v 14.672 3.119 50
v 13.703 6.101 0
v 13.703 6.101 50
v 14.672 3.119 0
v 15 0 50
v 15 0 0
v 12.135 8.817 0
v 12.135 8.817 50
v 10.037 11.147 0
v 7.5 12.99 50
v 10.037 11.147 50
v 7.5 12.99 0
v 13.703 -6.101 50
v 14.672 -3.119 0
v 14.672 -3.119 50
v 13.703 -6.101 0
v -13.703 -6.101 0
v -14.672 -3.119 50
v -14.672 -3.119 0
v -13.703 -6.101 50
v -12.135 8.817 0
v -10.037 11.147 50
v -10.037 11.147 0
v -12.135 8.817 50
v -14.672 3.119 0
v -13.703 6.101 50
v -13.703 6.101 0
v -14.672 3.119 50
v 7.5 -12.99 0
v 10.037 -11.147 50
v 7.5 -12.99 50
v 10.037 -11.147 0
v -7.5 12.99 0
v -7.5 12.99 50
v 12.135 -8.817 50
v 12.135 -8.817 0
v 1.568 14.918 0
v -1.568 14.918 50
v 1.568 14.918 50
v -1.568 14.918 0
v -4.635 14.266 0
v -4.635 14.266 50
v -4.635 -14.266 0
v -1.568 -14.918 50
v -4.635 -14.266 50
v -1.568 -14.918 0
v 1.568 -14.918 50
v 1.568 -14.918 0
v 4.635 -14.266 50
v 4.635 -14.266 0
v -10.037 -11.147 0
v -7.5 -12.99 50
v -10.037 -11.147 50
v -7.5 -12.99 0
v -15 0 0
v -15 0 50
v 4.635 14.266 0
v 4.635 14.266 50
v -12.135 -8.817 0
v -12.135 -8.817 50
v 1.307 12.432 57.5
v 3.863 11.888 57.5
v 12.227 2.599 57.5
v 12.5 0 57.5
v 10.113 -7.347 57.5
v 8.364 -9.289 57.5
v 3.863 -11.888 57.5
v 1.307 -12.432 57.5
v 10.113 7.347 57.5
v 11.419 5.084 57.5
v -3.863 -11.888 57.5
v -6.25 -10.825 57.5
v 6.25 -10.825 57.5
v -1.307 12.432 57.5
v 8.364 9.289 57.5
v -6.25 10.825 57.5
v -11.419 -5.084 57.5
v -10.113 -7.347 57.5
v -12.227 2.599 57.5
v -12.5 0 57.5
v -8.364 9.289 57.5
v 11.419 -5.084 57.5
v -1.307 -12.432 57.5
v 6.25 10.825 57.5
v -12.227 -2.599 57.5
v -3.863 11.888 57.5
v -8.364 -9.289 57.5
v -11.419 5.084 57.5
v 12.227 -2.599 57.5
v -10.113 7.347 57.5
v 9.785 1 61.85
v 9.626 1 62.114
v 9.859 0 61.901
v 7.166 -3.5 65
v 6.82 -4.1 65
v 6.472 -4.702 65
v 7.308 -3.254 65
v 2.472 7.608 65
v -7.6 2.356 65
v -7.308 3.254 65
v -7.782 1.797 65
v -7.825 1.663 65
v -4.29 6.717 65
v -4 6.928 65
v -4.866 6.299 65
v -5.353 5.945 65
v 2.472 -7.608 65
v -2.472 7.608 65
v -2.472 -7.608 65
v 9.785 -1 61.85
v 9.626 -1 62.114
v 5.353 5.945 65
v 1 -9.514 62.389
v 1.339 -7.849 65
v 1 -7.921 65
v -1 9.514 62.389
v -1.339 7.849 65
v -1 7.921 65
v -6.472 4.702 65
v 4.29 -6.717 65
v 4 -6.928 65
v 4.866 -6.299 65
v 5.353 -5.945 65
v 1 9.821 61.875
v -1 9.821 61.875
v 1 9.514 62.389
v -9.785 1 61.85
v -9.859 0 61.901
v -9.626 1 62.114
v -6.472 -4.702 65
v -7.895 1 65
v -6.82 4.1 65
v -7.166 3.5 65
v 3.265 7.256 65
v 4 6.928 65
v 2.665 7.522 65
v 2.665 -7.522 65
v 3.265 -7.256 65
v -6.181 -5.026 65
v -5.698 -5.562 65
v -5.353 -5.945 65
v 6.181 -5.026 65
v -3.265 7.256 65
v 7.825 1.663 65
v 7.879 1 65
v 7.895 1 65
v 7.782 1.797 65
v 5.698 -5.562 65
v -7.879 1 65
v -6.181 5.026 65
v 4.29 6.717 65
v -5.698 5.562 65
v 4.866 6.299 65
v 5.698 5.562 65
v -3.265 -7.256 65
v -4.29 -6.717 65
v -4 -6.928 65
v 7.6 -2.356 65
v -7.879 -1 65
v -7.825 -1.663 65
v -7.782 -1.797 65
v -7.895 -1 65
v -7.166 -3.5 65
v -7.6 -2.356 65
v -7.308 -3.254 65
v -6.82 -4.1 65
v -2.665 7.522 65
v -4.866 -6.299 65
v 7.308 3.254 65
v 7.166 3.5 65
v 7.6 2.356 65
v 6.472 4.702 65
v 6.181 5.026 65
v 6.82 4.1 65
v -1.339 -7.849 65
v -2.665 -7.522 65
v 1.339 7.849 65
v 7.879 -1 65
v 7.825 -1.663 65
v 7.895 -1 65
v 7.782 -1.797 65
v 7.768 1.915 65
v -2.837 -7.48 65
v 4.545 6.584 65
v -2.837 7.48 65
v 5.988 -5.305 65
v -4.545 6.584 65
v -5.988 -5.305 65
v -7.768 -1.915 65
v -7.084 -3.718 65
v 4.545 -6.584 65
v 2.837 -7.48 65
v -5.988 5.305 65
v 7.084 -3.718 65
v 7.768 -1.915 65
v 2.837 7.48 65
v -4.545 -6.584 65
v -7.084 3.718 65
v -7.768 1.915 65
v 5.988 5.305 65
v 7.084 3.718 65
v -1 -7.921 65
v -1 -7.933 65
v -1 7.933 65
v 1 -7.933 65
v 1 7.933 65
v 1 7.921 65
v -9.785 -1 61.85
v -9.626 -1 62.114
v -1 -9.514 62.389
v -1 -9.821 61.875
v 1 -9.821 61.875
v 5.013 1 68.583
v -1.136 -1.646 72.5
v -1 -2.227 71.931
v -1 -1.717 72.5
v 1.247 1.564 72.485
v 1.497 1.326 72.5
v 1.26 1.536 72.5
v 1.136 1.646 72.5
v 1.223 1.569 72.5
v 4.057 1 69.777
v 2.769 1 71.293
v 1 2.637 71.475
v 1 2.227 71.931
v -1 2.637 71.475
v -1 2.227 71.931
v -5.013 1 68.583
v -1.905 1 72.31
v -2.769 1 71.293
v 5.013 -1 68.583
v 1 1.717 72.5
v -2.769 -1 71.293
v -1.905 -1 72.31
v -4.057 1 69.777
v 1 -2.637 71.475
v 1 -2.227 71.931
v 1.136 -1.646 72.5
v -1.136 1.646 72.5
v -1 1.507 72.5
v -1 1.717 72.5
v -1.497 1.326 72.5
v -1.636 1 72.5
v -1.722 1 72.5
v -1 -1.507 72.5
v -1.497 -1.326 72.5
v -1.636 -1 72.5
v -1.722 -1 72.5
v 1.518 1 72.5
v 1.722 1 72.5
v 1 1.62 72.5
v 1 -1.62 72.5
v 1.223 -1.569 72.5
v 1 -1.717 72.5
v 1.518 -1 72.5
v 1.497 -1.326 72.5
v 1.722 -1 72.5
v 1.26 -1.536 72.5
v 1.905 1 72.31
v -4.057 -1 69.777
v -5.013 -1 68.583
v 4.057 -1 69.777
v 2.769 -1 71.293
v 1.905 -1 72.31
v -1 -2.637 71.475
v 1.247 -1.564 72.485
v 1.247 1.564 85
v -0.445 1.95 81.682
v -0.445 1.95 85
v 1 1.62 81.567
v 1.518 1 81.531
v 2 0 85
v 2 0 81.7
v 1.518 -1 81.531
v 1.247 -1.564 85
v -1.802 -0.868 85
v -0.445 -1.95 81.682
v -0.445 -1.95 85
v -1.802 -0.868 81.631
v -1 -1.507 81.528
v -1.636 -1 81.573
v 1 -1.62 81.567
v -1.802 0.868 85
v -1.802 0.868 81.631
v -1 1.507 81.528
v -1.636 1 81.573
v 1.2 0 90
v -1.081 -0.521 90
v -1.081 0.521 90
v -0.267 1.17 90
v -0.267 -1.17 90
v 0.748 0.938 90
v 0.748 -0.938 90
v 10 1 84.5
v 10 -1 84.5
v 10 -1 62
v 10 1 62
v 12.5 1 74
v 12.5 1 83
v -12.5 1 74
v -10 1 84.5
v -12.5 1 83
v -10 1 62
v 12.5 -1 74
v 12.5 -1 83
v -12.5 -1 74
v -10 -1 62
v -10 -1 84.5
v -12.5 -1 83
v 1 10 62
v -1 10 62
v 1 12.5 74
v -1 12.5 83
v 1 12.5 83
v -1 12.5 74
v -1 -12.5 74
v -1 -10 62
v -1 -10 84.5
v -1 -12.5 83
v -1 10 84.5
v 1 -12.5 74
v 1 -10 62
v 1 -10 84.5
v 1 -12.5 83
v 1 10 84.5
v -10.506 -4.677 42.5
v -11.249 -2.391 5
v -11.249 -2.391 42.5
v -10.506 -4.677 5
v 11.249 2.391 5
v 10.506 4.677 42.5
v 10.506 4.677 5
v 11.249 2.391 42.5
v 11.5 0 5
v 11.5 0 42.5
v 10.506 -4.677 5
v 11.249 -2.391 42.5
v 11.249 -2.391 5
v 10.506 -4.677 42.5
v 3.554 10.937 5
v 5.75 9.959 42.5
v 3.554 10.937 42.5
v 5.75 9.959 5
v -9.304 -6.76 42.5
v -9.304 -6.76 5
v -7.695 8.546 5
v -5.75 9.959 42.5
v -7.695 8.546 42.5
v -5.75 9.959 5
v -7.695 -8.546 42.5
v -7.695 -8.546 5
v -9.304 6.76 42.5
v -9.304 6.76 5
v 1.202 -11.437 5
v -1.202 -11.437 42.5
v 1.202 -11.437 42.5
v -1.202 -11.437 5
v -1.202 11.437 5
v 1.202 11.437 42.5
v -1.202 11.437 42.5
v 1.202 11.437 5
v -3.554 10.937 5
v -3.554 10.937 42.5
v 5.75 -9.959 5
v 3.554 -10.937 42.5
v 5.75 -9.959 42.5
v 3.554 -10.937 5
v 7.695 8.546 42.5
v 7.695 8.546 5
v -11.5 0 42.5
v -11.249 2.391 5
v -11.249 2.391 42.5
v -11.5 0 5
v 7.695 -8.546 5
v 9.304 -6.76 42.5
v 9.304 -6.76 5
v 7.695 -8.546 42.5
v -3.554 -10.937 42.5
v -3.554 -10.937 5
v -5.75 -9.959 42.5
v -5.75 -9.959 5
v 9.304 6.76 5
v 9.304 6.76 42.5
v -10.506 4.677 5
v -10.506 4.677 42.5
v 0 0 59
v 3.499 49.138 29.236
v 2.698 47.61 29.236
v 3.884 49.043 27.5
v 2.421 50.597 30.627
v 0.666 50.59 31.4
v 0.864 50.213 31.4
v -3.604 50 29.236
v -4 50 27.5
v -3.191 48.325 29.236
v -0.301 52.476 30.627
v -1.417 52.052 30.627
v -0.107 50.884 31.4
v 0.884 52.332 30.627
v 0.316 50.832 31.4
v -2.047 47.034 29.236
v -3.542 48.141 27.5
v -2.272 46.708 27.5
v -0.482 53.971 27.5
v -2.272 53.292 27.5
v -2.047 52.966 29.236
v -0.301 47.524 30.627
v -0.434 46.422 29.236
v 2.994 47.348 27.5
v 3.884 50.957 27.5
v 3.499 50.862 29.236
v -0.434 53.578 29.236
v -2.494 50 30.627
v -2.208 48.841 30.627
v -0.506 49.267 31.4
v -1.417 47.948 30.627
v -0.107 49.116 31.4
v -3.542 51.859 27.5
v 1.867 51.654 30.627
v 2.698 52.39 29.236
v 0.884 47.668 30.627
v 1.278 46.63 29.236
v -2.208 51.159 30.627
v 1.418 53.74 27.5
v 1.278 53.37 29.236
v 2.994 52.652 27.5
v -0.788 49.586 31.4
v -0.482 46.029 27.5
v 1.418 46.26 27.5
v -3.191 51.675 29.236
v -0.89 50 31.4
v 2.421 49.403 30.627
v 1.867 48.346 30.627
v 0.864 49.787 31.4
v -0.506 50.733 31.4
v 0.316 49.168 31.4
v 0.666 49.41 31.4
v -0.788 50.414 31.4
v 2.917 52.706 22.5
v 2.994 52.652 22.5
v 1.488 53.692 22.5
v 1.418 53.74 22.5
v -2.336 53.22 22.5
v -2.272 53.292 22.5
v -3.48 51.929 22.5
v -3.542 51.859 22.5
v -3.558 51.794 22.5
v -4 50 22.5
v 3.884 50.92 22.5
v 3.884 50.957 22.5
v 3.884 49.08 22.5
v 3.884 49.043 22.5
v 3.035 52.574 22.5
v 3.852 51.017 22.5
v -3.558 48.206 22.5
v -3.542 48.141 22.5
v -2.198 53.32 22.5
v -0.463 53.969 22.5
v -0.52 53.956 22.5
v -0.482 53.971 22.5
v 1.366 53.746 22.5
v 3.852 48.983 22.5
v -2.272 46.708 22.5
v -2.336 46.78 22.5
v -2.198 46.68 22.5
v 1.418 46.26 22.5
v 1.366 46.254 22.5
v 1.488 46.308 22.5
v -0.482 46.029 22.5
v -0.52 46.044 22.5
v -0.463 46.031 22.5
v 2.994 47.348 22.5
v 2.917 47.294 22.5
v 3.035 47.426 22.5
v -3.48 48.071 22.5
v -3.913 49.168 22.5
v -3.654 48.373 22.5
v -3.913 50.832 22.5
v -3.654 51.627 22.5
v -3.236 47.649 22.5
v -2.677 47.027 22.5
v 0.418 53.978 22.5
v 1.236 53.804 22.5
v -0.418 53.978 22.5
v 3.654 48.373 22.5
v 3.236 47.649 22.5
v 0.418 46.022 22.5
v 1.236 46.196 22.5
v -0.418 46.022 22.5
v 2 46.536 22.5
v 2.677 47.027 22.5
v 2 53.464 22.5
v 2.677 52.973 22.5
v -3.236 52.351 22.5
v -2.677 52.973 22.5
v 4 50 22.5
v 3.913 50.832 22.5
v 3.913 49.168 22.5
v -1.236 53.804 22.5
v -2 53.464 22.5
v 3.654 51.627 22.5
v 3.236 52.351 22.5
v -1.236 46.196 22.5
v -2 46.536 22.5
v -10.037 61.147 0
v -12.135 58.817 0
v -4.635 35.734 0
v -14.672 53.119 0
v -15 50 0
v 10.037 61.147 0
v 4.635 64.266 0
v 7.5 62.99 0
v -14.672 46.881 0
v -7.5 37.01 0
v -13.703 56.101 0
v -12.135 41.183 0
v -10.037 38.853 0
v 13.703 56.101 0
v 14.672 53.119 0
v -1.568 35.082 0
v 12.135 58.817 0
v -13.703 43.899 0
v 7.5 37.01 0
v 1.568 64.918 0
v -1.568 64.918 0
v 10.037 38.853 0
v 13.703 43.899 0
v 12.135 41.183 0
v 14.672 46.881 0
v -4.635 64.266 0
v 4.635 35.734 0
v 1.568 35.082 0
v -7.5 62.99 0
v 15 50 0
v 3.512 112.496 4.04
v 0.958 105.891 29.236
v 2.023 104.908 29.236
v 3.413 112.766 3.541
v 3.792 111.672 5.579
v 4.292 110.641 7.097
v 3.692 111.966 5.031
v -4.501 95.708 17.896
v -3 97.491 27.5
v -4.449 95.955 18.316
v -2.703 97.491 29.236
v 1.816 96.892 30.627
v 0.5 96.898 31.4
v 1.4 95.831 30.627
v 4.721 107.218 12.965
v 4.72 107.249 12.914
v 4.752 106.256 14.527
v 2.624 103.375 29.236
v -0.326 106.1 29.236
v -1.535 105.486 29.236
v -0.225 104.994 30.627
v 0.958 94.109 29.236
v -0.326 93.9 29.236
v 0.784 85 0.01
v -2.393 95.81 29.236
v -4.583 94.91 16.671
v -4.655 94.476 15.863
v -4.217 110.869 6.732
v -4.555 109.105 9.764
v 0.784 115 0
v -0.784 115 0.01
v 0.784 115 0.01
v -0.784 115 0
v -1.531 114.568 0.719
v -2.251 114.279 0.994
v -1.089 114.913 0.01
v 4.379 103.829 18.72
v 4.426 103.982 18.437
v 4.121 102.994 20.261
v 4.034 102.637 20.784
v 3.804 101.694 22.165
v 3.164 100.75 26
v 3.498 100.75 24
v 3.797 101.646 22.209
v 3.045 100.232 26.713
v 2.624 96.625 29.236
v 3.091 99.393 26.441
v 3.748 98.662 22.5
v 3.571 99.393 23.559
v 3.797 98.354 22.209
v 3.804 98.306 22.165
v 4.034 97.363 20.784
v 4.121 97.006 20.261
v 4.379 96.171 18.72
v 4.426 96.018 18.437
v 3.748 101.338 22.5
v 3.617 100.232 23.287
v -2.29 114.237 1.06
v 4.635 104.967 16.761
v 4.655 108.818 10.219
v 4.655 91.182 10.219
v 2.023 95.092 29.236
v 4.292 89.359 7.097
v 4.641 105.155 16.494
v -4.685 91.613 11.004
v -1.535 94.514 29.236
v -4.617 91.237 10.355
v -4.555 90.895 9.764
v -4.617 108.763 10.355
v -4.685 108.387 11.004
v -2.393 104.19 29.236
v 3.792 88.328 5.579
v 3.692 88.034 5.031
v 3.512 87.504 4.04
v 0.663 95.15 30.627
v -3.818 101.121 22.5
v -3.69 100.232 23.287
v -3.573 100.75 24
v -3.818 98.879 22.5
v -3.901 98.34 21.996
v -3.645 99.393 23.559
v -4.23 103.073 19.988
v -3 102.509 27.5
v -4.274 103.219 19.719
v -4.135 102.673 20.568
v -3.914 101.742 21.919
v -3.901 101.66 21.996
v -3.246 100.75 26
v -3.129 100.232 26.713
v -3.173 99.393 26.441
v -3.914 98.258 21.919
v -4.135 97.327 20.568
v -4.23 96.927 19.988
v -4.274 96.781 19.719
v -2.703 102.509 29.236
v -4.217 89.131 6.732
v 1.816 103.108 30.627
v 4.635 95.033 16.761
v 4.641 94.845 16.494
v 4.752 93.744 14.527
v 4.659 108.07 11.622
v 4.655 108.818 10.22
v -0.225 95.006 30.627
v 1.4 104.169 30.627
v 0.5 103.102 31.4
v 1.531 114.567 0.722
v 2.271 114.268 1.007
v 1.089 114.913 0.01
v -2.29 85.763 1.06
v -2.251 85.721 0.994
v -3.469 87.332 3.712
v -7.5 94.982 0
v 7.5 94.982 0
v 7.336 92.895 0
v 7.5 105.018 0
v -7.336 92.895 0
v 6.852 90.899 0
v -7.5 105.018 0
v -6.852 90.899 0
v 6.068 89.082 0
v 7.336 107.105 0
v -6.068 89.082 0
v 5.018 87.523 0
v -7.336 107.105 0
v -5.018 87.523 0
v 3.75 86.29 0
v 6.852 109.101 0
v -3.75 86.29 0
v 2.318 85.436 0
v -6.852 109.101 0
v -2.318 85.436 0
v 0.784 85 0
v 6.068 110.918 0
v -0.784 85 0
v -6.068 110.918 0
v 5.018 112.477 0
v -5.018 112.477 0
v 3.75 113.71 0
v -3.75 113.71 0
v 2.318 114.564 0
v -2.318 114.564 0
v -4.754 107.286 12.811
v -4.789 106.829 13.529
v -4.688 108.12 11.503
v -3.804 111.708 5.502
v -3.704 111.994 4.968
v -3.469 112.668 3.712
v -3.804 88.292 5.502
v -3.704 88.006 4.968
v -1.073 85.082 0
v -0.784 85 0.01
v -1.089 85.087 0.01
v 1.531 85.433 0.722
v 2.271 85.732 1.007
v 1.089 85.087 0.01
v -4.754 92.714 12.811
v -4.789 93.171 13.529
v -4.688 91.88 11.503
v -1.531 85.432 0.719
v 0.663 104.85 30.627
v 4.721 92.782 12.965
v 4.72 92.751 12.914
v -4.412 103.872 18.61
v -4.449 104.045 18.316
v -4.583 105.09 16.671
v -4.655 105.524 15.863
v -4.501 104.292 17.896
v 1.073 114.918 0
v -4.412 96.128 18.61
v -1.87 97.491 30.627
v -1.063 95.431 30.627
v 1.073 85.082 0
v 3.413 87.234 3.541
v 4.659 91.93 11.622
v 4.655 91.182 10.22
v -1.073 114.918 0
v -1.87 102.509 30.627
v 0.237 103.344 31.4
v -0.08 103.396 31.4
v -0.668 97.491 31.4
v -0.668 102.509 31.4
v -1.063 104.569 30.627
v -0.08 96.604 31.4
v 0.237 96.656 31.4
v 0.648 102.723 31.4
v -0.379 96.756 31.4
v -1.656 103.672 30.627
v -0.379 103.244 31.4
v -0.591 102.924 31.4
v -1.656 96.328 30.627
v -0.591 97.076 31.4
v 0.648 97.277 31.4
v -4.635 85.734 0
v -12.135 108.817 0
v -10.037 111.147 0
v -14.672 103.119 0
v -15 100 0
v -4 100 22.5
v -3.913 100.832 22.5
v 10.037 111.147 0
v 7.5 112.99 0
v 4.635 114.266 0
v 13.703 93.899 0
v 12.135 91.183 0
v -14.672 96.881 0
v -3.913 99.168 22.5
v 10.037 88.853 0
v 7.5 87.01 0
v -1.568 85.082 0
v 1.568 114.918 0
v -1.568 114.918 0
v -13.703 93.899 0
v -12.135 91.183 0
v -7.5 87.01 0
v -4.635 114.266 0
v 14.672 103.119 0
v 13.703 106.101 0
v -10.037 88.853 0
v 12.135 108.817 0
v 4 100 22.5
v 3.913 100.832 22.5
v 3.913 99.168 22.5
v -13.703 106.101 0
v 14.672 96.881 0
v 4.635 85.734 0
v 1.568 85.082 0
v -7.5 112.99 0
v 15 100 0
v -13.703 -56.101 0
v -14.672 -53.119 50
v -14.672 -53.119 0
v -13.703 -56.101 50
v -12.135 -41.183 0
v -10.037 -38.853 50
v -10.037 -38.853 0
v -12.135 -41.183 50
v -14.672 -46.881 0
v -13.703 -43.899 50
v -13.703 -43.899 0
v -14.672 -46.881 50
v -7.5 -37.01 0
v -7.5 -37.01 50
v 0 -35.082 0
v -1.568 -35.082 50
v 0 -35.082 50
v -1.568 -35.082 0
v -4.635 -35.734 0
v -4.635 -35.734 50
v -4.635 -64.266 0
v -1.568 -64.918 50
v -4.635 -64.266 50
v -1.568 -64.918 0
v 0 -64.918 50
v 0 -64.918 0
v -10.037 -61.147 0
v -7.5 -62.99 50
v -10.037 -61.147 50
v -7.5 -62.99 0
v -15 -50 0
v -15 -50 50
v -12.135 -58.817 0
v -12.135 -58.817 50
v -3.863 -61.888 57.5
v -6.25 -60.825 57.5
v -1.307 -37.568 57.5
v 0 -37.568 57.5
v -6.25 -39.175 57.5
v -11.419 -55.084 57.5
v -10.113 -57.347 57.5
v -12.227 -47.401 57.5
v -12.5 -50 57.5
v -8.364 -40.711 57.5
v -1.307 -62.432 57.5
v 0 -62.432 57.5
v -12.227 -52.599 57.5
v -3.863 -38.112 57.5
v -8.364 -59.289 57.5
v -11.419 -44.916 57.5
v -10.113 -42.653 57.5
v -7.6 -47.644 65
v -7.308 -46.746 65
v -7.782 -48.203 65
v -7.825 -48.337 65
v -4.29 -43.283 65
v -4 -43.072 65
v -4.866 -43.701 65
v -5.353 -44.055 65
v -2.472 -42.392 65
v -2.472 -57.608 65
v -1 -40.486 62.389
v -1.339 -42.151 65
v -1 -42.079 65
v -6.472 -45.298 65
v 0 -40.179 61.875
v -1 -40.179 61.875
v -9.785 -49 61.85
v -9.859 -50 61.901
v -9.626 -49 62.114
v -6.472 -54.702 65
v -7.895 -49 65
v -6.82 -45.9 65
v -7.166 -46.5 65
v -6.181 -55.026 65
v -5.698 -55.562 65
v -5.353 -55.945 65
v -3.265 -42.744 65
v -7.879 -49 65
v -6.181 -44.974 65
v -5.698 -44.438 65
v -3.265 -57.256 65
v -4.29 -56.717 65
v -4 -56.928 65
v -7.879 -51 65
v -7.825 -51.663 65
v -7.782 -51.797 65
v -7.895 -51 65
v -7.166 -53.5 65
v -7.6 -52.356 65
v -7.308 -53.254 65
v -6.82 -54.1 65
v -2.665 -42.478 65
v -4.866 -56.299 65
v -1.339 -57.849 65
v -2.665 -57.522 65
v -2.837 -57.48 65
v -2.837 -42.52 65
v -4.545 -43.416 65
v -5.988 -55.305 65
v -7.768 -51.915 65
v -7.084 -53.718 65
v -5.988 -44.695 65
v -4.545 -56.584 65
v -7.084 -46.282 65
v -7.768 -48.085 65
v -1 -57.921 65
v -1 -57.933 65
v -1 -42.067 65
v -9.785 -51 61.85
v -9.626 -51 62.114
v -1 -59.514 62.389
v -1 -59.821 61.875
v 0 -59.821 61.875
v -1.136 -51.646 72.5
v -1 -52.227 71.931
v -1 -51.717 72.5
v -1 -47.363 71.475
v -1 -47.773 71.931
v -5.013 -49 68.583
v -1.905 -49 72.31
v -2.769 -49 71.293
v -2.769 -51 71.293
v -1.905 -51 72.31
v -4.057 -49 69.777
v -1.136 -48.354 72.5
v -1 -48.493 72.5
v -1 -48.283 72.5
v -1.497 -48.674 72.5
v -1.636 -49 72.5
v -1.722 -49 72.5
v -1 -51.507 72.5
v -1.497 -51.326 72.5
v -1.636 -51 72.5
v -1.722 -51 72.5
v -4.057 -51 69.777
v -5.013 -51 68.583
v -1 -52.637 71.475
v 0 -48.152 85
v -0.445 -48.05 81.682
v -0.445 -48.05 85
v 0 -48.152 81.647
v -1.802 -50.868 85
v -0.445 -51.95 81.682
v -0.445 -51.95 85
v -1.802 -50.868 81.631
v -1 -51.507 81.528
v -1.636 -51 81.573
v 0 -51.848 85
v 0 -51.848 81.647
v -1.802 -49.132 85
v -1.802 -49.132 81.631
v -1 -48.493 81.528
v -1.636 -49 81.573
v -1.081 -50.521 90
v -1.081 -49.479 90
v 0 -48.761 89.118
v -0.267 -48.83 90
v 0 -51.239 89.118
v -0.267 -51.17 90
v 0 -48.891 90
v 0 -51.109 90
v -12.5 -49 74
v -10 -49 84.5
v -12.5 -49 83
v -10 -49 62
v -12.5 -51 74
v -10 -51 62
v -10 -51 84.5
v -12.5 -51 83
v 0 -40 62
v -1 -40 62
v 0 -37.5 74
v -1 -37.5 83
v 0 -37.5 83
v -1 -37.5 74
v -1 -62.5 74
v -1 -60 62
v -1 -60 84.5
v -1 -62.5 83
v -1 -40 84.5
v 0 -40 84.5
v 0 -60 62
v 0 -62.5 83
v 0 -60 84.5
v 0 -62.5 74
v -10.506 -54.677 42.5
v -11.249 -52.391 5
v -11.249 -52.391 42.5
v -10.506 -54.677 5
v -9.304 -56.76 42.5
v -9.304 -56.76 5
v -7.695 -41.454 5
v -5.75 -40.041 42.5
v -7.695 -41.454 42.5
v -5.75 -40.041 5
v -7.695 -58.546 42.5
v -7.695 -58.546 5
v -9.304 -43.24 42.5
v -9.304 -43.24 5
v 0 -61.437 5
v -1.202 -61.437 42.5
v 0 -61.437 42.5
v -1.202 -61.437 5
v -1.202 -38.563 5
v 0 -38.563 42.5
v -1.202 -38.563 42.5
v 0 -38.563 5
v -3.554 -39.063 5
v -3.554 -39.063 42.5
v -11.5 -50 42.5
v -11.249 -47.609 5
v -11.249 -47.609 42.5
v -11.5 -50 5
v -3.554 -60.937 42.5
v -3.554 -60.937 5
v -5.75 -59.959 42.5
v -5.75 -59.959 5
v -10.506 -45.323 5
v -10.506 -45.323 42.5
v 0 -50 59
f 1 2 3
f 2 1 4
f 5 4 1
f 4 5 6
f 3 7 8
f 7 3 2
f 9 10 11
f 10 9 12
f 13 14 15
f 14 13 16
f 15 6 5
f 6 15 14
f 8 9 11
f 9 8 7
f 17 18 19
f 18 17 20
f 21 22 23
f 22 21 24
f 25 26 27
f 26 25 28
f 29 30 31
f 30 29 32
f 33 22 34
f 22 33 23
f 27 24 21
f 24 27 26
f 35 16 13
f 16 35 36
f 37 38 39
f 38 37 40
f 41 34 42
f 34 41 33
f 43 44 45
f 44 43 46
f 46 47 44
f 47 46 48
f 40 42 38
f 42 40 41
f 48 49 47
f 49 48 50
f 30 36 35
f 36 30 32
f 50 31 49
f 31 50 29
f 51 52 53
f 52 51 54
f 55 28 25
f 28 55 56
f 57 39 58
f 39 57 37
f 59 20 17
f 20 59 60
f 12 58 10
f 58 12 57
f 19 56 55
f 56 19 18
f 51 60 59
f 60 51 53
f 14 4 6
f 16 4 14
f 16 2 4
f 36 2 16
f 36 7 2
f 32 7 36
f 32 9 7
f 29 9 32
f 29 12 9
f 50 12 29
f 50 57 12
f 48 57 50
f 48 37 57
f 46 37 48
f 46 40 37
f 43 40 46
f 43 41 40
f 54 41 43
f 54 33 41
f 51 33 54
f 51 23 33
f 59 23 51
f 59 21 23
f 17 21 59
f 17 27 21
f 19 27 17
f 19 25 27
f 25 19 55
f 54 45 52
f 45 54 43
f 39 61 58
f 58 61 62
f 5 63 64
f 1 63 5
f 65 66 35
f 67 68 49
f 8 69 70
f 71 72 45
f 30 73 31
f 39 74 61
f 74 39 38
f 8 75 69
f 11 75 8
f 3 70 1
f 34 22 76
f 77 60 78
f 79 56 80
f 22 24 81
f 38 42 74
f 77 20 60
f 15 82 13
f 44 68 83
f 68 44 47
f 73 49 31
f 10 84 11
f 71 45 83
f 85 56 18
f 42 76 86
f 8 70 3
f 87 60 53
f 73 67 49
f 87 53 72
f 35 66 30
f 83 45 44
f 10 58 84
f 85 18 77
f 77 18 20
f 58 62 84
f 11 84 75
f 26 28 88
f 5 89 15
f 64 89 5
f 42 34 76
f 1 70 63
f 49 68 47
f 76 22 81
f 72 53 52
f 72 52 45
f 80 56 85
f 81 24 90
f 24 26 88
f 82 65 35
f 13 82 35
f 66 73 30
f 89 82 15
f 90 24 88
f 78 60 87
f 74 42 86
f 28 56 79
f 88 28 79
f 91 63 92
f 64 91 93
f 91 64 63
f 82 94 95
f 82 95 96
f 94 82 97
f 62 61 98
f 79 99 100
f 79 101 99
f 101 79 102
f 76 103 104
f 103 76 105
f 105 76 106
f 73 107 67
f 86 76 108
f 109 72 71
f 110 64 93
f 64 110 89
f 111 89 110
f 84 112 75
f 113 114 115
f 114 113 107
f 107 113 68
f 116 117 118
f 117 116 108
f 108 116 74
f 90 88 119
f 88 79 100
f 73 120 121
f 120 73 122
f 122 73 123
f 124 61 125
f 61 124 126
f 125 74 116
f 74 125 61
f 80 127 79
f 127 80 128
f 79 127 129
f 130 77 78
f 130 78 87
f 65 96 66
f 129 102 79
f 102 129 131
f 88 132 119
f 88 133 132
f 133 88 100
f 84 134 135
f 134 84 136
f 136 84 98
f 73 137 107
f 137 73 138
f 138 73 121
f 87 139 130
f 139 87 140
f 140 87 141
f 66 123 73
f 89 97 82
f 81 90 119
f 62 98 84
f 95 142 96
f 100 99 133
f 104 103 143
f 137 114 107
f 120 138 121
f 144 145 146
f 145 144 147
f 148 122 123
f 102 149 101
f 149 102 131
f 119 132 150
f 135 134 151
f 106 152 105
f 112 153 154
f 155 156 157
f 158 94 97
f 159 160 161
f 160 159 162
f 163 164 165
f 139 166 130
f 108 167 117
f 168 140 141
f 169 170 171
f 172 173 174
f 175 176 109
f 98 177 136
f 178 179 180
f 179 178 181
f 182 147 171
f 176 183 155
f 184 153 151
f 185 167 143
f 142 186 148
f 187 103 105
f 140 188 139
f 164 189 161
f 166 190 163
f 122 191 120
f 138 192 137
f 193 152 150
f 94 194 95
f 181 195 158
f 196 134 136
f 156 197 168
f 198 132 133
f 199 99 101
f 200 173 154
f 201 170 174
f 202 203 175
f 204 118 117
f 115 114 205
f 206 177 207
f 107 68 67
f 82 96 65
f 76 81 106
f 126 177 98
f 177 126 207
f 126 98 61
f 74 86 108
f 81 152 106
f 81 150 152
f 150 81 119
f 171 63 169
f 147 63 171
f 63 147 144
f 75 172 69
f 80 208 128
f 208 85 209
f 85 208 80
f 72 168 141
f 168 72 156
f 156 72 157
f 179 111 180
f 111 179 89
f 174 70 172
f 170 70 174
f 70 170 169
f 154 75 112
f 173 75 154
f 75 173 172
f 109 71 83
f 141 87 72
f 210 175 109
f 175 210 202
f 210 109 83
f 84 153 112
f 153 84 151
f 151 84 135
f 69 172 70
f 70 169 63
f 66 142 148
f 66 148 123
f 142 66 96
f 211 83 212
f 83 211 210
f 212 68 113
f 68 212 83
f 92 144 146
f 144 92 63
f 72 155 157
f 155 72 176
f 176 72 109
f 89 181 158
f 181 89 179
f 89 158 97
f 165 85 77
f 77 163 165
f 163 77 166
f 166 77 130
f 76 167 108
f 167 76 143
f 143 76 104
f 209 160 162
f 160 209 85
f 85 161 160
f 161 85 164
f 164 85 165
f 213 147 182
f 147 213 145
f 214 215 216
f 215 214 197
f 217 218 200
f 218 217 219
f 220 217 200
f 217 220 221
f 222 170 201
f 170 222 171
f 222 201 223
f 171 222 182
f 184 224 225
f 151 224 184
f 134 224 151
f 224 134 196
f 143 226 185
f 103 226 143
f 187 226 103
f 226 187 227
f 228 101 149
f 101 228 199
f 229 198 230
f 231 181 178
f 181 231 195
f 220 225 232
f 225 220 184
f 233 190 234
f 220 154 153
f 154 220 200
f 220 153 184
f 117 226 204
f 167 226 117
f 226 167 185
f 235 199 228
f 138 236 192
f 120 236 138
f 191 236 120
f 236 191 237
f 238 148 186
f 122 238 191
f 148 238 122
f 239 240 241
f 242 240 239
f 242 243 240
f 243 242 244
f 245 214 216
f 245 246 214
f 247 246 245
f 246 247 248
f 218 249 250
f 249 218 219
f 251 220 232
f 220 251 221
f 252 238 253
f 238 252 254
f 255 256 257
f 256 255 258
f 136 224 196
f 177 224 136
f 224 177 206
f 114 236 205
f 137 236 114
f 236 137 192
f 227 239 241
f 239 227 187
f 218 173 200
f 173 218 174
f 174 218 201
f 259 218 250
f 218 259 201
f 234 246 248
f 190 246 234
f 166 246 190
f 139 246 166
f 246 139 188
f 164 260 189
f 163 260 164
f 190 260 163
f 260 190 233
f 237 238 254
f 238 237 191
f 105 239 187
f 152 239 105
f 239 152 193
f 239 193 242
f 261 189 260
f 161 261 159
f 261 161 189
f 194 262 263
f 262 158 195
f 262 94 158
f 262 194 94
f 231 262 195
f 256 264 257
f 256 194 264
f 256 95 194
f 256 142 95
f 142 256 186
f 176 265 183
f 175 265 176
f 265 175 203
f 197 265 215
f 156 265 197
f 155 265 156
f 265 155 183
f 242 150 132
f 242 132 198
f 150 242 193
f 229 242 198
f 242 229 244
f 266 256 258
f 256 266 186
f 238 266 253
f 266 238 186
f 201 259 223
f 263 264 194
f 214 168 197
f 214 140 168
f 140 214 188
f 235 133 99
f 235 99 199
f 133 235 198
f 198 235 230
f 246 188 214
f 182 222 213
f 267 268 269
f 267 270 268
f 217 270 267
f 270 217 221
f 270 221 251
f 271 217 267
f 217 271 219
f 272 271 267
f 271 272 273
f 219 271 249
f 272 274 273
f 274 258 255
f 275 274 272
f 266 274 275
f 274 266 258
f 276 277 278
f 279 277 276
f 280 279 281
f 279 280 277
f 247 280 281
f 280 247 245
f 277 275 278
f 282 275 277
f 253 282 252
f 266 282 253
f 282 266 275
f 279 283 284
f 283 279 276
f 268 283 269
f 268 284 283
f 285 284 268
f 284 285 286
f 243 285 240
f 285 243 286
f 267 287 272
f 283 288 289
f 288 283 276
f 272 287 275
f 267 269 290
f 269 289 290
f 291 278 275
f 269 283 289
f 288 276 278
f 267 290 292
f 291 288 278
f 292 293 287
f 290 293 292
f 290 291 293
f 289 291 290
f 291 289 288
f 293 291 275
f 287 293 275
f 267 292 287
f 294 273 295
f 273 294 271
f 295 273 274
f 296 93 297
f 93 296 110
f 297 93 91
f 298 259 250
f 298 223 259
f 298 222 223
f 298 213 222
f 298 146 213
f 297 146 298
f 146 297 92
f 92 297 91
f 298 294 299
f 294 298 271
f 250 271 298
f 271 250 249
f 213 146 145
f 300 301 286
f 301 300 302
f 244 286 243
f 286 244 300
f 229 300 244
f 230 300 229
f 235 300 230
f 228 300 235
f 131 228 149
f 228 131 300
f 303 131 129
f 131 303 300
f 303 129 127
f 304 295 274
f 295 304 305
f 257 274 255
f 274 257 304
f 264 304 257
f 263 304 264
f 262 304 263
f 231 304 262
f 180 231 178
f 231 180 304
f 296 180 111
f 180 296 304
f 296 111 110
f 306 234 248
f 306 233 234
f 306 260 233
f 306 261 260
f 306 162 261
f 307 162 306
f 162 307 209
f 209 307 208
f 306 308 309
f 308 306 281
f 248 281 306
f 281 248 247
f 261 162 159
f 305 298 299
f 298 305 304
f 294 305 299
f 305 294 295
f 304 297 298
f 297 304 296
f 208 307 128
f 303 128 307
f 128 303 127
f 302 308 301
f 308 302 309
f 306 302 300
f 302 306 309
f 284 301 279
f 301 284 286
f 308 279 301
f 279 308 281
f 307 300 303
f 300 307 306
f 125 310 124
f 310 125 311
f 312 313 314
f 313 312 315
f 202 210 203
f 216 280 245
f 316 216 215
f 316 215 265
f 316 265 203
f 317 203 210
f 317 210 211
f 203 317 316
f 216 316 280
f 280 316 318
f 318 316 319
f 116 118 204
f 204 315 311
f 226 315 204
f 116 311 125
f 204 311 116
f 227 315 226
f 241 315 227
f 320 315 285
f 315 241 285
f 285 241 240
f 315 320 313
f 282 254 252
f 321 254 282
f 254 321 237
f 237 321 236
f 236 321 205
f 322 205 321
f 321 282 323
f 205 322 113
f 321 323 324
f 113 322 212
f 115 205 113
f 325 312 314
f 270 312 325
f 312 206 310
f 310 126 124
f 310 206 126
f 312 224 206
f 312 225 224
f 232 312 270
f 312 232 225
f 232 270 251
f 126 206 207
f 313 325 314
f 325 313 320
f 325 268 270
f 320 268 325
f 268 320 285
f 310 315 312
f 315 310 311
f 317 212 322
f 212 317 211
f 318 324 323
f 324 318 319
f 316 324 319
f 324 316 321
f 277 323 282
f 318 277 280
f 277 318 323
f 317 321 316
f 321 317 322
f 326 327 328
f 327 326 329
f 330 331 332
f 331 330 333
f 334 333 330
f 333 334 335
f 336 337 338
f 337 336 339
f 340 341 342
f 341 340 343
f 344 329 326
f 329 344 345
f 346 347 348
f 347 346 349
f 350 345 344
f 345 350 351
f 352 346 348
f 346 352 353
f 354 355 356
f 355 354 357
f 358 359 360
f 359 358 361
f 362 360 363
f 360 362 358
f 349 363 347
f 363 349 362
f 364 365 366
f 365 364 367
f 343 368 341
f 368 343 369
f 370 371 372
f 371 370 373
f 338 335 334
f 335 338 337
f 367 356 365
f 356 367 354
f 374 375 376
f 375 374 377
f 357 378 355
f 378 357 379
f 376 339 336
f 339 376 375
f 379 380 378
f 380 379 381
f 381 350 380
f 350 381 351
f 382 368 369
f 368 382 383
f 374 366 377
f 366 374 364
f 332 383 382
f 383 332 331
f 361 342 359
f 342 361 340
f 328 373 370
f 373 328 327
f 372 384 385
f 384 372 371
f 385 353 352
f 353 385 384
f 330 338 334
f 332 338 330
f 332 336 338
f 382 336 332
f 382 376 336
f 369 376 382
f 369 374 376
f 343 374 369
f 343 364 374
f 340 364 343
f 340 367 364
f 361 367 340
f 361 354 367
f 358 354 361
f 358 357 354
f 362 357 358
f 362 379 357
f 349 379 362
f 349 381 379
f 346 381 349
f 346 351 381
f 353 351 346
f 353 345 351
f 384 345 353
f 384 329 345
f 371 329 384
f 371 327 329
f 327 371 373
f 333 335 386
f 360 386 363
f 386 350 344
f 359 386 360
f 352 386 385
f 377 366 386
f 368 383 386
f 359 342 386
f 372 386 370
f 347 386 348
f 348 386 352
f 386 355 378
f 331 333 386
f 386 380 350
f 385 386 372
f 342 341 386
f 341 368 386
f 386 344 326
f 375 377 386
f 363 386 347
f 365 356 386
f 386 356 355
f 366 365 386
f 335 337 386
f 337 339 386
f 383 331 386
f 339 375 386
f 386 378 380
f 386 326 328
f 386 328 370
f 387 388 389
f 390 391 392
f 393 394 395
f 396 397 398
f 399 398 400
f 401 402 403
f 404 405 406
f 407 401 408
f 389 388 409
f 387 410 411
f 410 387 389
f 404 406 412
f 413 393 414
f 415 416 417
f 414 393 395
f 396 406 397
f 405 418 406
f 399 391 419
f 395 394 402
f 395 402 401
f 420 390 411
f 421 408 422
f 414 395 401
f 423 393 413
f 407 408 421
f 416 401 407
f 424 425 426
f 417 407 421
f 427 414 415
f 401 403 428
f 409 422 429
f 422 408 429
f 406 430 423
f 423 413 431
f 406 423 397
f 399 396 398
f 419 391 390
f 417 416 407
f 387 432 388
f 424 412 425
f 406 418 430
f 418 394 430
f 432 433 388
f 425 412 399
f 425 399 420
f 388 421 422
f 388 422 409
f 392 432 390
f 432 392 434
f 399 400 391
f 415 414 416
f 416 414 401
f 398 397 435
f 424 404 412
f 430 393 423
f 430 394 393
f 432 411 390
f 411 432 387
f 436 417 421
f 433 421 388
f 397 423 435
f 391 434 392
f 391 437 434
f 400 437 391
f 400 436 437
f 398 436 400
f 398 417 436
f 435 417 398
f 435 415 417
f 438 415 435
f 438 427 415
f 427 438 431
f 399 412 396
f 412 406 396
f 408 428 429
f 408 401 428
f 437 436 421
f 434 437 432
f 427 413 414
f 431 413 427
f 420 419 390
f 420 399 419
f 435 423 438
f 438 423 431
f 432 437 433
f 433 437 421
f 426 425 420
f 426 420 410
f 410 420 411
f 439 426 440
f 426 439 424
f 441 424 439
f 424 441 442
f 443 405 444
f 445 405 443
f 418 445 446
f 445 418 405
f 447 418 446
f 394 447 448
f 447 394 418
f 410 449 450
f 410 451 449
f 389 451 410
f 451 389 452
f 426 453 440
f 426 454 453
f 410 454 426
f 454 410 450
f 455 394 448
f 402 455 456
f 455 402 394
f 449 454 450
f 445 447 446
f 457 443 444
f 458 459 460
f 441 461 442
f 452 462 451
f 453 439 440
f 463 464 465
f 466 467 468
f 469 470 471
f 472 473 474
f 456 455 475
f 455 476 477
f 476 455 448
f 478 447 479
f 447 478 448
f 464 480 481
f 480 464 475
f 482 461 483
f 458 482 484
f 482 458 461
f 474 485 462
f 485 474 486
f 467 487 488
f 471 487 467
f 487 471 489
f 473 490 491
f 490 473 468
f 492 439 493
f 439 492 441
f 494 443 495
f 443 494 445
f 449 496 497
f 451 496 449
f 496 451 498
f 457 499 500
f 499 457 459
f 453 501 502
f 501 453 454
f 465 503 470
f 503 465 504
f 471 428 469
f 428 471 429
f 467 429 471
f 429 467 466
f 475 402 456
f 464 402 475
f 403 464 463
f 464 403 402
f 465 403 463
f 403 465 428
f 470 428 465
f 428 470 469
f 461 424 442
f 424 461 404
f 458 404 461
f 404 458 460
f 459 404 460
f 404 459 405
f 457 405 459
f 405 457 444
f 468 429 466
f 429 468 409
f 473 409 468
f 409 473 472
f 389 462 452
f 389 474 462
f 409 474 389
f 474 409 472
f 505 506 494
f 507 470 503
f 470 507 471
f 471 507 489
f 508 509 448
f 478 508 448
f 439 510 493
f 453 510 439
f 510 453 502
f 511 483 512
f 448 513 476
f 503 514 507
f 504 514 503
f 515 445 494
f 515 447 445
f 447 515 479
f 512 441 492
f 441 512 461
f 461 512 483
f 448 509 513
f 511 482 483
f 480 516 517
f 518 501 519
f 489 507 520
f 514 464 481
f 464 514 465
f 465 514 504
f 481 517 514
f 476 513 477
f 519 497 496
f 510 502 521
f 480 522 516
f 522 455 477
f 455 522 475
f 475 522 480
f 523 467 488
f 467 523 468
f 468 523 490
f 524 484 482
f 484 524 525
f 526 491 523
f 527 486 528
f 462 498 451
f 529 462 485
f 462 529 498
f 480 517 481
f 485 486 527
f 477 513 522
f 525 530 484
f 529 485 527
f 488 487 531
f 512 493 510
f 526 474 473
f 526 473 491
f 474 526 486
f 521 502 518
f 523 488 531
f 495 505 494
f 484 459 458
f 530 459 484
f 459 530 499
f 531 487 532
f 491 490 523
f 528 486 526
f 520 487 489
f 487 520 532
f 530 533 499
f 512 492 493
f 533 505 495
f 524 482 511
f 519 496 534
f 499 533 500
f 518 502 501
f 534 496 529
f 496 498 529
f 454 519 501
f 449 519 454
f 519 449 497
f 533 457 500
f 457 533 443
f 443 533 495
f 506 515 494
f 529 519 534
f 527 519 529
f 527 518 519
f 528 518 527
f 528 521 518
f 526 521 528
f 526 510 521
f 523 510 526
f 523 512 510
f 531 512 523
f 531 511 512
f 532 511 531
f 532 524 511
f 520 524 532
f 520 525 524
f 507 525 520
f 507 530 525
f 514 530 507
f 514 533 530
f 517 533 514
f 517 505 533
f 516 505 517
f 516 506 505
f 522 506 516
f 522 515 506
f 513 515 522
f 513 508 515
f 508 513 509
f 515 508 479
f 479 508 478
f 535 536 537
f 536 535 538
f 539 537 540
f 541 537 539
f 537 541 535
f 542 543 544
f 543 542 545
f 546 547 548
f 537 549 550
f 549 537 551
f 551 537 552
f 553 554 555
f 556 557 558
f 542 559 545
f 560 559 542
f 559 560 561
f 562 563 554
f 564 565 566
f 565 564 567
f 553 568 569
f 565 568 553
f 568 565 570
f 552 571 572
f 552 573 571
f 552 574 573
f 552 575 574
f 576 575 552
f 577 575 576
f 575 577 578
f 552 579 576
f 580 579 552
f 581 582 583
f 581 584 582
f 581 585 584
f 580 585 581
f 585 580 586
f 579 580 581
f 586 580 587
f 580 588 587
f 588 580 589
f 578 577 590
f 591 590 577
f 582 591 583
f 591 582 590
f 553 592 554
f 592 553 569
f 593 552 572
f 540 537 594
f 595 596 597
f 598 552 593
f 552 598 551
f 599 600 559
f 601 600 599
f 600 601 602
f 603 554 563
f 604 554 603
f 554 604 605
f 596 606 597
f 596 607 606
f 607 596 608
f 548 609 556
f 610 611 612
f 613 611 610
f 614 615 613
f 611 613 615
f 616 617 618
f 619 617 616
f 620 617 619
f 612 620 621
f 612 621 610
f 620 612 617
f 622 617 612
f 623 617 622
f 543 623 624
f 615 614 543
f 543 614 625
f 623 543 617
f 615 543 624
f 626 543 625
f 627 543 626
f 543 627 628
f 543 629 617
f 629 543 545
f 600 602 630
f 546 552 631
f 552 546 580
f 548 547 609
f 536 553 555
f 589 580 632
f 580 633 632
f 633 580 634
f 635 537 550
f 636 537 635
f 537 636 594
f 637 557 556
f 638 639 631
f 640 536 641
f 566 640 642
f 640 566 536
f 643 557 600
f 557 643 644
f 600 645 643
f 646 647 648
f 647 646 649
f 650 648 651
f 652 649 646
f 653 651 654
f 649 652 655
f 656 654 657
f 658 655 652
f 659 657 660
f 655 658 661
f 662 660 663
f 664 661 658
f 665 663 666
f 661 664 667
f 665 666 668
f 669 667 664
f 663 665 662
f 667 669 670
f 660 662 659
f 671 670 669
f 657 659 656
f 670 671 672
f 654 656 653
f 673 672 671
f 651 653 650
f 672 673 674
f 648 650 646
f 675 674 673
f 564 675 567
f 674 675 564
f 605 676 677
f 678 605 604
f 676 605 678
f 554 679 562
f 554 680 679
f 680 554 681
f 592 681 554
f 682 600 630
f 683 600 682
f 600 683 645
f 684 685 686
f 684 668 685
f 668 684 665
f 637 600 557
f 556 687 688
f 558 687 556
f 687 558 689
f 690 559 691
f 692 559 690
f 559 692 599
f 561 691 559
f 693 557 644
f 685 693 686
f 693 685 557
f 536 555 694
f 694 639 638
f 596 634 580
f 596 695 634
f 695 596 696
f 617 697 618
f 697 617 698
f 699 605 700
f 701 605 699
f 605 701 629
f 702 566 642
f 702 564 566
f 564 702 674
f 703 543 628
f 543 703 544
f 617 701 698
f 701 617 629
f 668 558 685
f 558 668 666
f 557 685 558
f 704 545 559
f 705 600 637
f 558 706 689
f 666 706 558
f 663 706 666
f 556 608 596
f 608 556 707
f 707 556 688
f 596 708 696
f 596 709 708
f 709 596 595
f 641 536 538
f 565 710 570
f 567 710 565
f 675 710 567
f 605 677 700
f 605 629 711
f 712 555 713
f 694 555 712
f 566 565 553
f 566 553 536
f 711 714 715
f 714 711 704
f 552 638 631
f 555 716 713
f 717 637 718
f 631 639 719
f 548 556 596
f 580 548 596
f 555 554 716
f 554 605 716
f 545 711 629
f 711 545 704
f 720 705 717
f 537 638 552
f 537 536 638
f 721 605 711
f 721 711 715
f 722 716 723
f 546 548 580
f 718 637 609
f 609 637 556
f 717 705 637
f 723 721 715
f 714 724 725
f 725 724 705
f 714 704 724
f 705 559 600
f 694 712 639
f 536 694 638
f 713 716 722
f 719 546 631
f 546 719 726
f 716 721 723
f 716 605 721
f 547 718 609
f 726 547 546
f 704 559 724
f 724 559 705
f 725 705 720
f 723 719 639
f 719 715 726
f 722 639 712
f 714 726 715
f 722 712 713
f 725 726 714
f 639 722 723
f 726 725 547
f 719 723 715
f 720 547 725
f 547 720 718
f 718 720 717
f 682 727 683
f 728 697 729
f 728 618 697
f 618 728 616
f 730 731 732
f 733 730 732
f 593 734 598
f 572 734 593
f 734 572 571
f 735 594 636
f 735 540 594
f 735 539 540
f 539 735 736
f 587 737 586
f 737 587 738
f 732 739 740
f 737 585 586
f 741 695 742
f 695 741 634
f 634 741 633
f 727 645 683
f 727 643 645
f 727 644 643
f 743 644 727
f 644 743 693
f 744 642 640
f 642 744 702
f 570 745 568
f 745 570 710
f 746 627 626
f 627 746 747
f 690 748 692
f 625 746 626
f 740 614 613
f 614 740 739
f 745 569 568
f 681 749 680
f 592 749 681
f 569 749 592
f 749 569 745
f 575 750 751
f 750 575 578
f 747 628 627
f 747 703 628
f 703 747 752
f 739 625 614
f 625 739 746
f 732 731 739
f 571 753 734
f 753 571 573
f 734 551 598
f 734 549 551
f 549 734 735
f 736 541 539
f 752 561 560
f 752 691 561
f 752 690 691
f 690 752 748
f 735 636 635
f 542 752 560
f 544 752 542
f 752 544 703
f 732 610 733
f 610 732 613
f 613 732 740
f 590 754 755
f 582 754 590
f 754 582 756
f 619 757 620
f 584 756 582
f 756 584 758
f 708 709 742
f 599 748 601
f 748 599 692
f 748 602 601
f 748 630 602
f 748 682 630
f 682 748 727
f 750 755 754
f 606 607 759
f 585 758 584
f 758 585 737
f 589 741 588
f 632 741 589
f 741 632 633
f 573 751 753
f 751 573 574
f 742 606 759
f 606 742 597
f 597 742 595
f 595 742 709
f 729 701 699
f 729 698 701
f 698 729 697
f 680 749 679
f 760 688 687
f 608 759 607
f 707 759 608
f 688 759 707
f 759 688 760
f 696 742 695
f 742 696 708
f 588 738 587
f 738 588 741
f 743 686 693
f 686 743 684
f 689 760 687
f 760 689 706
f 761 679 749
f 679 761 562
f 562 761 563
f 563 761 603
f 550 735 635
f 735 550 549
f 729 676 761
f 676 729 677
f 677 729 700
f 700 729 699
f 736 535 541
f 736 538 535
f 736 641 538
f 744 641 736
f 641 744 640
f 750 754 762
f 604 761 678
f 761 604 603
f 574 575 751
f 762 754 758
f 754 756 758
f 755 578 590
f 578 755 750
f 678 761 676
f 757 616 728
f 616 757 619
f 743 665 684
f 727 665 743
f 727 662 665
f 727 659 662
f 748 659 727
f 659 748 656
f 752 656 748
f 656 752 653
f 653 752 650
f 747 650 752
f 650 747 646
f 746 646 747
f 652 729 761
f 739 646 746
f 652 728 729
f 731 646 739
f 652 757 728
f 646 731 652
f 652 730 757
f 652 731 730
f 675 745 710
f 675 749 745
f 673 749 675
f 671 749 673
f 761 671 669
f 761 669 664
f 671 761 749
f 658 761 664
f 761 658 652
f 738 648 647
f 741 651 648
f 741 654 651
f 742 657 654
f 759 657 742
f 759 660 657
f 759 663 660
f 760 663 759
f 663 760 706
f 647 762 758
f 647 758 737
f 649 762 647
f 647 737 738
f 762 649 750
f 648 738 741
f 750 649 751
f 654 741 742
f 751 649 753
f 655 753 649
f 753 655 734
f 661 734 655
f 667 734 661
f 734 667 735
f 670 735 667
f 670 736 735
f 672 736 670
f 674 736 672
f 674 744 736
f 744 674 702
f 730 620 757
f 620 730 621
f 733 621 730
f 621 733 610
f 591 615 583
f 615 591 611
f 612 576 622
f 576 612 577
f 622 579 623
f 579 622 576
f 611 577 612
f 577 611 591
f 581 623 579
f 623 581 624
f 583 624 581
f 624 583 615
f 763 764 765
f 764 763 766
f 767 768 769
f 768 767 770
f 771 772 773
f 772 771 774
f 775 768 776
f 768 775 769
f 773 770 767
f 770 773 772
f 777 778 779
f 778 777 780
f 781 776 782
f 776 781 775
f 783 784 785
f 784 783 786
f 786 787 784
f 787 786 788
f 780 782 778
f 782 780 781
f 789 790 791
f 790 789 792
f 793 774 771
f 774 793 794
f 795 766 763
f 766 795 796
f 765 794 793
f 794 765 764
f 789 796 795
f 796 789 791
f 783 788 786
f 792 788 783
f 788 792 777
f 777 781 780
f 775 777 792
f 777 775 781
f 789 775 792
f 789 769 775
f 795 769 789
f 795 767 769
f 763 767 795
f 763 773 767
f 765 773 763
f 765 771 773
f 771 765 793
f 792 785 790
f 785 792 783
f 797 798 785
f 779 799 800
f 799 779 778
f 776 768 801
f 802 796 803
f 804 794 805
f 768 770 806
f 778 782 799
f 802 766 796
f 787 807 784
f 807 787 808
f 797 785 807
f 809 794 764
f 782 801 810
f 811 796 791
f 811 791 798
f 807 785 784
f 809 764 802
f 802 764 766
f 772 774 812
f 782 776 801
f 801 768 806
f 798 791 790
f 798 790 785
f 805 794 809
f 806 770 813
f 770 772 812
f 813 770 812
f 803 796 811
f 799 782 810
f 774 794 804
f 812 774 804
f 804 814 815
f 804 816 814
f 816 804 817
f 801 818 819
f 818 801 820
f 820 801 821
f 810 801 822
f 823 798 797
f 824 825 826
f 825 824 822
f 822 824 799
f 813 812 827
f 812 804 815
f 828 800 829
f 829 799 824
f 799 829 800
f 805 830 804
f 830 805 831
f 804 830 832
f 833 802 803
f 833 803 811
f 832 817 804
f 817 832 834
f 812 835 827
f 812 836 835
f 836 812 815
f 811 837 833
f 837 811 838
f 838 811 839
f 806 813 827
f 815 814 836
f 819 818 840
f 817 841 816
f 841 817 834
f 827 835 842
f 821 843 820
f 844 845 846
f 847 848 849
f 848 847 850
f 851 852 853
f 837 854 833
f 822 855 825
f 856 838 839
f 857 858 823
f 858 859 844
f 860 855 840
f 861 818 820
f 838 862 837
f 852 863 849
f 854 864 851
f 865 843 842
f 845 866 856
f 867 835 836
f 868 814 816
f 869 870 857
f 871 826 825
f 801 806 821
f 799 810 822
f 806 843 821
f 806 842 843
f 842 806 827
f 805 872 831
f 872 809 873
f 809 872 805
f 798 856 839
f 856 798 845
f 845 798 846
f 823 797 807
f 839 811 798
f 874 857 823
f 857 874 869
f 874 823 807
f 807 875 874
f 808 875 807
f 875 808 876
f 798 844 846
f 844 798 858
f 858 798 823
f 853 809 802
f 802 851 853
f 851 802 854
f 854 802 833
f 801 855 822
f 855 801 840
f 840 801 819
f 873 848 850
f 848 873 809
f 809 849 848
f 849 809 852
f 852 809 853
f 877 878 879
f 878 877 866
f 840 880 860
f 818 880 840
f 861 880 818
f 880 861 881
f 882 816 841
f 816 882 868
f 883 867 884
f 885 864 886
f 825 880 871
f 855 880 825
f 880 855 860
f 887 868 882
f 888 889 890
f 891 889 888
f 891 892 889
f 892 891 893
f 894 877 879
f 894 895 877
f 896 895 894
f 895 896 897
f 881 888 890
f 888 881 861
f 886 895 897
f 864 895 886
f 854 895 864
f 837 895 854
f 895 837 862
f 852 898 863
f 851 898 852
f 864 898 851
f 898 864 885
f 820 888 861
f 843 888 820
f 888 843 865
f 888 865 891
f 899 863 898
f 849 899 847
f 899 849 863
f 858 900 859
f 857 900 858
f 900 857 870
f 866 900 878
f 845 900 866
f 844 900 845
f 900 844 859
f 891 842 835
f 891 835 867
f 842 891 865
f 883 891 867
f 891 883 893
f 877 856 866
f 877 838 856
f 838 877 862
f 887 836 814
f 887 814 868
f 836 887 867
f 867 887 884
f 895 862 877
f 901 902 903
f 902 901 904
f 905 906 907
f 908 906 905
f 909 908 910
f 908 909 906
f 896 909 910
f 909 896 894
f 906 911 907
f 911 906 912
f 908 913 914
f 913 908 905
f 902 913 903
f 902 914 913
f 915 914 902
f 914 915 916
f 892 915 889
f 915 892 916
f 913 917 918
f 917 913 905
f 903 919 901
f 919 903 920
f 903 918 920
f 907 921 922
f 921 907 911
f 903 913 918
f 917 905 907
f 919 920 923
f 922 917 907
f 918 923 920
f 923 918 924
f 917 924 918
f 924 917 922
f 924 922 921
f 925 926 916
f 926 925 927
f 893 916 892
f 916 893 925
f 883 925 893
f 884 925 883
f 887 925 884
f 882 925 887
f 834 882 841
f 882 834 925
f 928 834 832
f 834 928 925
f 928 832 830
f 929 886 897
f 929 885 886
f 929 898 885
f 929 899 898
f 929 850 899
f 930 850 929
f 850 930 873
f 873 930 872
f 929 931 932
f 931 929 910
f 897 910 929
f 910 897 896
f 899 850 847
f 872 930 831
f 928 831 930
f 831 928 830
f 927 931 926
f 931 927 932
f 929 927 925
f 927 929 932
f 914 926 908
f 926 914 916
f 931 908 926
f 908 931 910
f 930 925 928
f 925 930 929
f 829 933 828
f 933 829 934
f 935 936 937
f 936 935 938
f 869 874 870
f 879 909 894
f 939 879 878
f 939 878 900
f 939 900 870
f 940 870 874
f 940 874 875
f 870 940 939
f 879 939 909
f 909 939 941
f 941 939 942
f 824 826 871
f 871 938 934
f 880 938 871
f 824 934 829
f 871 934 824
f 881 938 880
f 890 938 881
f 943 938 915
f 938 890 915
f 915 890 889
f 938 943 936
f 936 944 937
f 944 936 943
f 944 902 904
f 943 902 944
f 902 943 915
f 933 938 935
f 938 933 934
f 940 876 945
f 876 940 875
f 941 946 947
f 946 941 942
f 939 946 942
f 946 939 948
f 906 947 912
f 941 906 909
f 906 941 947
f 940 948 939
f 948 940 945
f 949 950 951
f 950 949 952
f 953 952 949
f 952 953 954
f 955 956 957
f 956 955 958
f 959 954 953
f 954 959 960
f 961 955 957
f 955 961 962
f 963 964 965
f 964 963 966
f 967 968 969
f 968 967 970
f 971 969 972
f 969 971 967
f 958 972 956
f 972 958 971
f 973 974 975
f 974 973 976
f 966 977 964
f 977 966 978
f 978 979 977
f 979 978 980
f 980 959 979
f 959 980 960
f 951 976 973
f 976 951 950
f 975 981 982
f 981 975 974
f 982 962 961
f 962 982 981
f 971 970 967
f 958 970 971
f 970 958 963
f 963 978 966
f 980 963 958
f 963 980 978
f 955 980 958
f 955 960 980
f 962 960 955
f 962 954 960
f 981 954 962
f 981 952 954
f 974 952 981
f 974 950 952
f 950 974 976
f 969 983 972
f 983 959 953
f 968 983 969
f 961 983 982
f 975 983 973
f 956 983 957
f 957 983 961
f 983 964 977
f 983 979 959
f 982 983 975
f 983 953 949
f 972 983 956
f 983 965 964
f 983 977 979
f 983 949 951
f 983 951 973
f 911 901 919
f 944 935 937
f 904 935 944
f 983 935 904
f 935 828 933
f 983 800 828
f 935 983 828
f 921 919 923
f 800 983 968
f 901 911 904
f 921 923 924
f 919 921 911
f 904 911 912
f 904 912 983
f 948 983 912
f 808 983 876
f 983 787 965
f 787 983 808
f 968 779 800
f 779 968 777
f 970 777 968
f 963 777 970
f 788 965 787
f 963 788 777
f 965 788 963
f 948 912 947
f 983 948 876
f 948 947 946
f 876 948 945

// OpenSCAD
color([1,0,0]) difference() {

// body
union() {
        translate([0,0,0])
    cylinder(h=50,r1=15,r2=15,center=false);
        translate([0,0,50])
    cylinder(h=7.5,r1=15,r2=12.5,center=false);
        translate([0,0,57.5])
    cylinder(h=7.5,r1=12.5,r2=8,center=false);
        translate([0,0,65])
    cylinder(h=7.5,r1=8,r2=2,center=false);
    
        translate([0,0,65])
    cylinder(h=20,r1=2,r2=2,center=false);    
    translate([0,0,85])
        cylinder(h=5 ,r1=2,r2=1.2,center=false);    




// flights / marker
p2 = [0, 21];
p3 = [0 + 10, 27 - 2.5];
p3b = [0 + 12.5 , 27-1.5 - 2.5];
p4 = [12.5 , 14];
p4b = [0 + 10, 2];
p5 = [0, -5];
points = [ p2, p3, p3b, p4, p4b, p5];

translate([0,1,60])
rotate([90]) { linear_extrude(height=2){ polygon(points); } }

translate([0,-1,60])
rotate([90,0,180]) { linear_extrude(height=2){ polygon(points); } }

translate([-1,0,60])
rotate([90,0,90]) { linear_extrude(height=2){ polygon(points); } }

translate([1,0,60])
rotate([90,0,270]) { linear_extrude(height=2){ polygon(points); } }
}

// interne drijfbubbel
translate([0,0,5])
union() {
        translate([0,0,0])
    cylinder(h=37.5,r1=11.5,r2=11.5,center=false);
        translate([0,0,37.5])
    cylinder(h=16.5,r1=11.5,r2=0,center=false);
}

}










// onderstuk

translate([0,0,30]){
rotate(a=[0,180,0]){
translate([0,50,2.5])
sphere(4); 

translate([0,50,2.5])
cylinder(h=5,r1=4,r2=4,center=false);

translate([0,50,7.5])
cylinder(h=22.5,r1=4,r2=15,center=false);
}
}






// onderstuk
difference() {
translate([0,100,30]){
rotate(a=[0,180,0]){


union(){
resize([15,30,31.4]) {



hull() {
    hull() {
translate([0,-2.5,2.5])
sphere(4); 
translate([0,-5,30 - 0.01])
cylinder(h=0.01,r=10,center=false);
    }

    hull() {
translate([0,2.5,2.5])
sphere(4); 
translate([0,5,30 - 0.01])
cylinder(h=0.01,r=10,center=false);
    }
}
}

translate([0,0,7.5])
cylinder(h=22.5,r1=4,r2=15,center=false);
}
}



}



translate([0, 100, 29]) {
hull(){
translate([-20,0,-5]) {
rotate(a=[90,0,90]) {
cylinder(h=40,r=0.75,center=false);
}
}
translate([-20,0,-3]) {
rotate(a=[90,0,90]) {
cylinder(h=40,r=0.75,center=false);
}
}
}
}




}



// dwarsdoorsnede
difference() {

translate([0,-50,0])

color([0,0,1]) difference() {
// body
union() {
        translate([0,0,0])
    cylinder(h=50,r1=15,r2=15,center=false);
        translate([0,0,50])
    cylinder(h=7.5,r1=15,r2=12.5,center=false);
        translate([0,0,57.5])
    cylinder(h=7.5,r1=12.5,r2=8,center=false);
        translate([0,0,65])
    cylinder(h=7.5,r1=8,r2=2,center=false);
    
        translate([0,0,65])
    cylinder(h=20,r1=2,r2=2,center=false);    
    translate([0,0,85])
        cylinder(h=5 ,r1=2,r2=1.2,center=false);    


// flights / marker
p2 = [0, 21];
p3 = [0 + 10, 27 - 2.5];
p3b = [0 + 12.5 , 27-1.5 - 2.5];
p4 = [12.5 , 14];
p4b = [0 + 10, 2];
p5 = [0, -5];
points = [ p2, p3, p3b, p4, p4b, p5];

translate([0,1,60])
rotate([90]) { linear_extrude(height=2){ polygon(points); } }

translate([0,-1,60])
rotate([90,0,180]) { linear_extrude(height=2){ polygon(points); } }

translate([-1,0,60])
rotate([90,0,90]) { linear_extrude(height=2){ polygon(points); } }

translate([1,0,60])
rotate([90,0,270]) { linear_extrude(height=2){ polygon(points); } }
}
// interne drijfbubbel
translate([0,0,5])
union() {
        translate([0,0,0])
    cylinder(h=37.5,r1=11.5,r2=11.5,center=false);
        translate([0,0,37.5])
    cylinder(h=16.5,r1=11.5,r2=0,center=false);
}

}


translate([0,-70,-5])
      color([0,0,1])  cube([40,40,120]);

}
